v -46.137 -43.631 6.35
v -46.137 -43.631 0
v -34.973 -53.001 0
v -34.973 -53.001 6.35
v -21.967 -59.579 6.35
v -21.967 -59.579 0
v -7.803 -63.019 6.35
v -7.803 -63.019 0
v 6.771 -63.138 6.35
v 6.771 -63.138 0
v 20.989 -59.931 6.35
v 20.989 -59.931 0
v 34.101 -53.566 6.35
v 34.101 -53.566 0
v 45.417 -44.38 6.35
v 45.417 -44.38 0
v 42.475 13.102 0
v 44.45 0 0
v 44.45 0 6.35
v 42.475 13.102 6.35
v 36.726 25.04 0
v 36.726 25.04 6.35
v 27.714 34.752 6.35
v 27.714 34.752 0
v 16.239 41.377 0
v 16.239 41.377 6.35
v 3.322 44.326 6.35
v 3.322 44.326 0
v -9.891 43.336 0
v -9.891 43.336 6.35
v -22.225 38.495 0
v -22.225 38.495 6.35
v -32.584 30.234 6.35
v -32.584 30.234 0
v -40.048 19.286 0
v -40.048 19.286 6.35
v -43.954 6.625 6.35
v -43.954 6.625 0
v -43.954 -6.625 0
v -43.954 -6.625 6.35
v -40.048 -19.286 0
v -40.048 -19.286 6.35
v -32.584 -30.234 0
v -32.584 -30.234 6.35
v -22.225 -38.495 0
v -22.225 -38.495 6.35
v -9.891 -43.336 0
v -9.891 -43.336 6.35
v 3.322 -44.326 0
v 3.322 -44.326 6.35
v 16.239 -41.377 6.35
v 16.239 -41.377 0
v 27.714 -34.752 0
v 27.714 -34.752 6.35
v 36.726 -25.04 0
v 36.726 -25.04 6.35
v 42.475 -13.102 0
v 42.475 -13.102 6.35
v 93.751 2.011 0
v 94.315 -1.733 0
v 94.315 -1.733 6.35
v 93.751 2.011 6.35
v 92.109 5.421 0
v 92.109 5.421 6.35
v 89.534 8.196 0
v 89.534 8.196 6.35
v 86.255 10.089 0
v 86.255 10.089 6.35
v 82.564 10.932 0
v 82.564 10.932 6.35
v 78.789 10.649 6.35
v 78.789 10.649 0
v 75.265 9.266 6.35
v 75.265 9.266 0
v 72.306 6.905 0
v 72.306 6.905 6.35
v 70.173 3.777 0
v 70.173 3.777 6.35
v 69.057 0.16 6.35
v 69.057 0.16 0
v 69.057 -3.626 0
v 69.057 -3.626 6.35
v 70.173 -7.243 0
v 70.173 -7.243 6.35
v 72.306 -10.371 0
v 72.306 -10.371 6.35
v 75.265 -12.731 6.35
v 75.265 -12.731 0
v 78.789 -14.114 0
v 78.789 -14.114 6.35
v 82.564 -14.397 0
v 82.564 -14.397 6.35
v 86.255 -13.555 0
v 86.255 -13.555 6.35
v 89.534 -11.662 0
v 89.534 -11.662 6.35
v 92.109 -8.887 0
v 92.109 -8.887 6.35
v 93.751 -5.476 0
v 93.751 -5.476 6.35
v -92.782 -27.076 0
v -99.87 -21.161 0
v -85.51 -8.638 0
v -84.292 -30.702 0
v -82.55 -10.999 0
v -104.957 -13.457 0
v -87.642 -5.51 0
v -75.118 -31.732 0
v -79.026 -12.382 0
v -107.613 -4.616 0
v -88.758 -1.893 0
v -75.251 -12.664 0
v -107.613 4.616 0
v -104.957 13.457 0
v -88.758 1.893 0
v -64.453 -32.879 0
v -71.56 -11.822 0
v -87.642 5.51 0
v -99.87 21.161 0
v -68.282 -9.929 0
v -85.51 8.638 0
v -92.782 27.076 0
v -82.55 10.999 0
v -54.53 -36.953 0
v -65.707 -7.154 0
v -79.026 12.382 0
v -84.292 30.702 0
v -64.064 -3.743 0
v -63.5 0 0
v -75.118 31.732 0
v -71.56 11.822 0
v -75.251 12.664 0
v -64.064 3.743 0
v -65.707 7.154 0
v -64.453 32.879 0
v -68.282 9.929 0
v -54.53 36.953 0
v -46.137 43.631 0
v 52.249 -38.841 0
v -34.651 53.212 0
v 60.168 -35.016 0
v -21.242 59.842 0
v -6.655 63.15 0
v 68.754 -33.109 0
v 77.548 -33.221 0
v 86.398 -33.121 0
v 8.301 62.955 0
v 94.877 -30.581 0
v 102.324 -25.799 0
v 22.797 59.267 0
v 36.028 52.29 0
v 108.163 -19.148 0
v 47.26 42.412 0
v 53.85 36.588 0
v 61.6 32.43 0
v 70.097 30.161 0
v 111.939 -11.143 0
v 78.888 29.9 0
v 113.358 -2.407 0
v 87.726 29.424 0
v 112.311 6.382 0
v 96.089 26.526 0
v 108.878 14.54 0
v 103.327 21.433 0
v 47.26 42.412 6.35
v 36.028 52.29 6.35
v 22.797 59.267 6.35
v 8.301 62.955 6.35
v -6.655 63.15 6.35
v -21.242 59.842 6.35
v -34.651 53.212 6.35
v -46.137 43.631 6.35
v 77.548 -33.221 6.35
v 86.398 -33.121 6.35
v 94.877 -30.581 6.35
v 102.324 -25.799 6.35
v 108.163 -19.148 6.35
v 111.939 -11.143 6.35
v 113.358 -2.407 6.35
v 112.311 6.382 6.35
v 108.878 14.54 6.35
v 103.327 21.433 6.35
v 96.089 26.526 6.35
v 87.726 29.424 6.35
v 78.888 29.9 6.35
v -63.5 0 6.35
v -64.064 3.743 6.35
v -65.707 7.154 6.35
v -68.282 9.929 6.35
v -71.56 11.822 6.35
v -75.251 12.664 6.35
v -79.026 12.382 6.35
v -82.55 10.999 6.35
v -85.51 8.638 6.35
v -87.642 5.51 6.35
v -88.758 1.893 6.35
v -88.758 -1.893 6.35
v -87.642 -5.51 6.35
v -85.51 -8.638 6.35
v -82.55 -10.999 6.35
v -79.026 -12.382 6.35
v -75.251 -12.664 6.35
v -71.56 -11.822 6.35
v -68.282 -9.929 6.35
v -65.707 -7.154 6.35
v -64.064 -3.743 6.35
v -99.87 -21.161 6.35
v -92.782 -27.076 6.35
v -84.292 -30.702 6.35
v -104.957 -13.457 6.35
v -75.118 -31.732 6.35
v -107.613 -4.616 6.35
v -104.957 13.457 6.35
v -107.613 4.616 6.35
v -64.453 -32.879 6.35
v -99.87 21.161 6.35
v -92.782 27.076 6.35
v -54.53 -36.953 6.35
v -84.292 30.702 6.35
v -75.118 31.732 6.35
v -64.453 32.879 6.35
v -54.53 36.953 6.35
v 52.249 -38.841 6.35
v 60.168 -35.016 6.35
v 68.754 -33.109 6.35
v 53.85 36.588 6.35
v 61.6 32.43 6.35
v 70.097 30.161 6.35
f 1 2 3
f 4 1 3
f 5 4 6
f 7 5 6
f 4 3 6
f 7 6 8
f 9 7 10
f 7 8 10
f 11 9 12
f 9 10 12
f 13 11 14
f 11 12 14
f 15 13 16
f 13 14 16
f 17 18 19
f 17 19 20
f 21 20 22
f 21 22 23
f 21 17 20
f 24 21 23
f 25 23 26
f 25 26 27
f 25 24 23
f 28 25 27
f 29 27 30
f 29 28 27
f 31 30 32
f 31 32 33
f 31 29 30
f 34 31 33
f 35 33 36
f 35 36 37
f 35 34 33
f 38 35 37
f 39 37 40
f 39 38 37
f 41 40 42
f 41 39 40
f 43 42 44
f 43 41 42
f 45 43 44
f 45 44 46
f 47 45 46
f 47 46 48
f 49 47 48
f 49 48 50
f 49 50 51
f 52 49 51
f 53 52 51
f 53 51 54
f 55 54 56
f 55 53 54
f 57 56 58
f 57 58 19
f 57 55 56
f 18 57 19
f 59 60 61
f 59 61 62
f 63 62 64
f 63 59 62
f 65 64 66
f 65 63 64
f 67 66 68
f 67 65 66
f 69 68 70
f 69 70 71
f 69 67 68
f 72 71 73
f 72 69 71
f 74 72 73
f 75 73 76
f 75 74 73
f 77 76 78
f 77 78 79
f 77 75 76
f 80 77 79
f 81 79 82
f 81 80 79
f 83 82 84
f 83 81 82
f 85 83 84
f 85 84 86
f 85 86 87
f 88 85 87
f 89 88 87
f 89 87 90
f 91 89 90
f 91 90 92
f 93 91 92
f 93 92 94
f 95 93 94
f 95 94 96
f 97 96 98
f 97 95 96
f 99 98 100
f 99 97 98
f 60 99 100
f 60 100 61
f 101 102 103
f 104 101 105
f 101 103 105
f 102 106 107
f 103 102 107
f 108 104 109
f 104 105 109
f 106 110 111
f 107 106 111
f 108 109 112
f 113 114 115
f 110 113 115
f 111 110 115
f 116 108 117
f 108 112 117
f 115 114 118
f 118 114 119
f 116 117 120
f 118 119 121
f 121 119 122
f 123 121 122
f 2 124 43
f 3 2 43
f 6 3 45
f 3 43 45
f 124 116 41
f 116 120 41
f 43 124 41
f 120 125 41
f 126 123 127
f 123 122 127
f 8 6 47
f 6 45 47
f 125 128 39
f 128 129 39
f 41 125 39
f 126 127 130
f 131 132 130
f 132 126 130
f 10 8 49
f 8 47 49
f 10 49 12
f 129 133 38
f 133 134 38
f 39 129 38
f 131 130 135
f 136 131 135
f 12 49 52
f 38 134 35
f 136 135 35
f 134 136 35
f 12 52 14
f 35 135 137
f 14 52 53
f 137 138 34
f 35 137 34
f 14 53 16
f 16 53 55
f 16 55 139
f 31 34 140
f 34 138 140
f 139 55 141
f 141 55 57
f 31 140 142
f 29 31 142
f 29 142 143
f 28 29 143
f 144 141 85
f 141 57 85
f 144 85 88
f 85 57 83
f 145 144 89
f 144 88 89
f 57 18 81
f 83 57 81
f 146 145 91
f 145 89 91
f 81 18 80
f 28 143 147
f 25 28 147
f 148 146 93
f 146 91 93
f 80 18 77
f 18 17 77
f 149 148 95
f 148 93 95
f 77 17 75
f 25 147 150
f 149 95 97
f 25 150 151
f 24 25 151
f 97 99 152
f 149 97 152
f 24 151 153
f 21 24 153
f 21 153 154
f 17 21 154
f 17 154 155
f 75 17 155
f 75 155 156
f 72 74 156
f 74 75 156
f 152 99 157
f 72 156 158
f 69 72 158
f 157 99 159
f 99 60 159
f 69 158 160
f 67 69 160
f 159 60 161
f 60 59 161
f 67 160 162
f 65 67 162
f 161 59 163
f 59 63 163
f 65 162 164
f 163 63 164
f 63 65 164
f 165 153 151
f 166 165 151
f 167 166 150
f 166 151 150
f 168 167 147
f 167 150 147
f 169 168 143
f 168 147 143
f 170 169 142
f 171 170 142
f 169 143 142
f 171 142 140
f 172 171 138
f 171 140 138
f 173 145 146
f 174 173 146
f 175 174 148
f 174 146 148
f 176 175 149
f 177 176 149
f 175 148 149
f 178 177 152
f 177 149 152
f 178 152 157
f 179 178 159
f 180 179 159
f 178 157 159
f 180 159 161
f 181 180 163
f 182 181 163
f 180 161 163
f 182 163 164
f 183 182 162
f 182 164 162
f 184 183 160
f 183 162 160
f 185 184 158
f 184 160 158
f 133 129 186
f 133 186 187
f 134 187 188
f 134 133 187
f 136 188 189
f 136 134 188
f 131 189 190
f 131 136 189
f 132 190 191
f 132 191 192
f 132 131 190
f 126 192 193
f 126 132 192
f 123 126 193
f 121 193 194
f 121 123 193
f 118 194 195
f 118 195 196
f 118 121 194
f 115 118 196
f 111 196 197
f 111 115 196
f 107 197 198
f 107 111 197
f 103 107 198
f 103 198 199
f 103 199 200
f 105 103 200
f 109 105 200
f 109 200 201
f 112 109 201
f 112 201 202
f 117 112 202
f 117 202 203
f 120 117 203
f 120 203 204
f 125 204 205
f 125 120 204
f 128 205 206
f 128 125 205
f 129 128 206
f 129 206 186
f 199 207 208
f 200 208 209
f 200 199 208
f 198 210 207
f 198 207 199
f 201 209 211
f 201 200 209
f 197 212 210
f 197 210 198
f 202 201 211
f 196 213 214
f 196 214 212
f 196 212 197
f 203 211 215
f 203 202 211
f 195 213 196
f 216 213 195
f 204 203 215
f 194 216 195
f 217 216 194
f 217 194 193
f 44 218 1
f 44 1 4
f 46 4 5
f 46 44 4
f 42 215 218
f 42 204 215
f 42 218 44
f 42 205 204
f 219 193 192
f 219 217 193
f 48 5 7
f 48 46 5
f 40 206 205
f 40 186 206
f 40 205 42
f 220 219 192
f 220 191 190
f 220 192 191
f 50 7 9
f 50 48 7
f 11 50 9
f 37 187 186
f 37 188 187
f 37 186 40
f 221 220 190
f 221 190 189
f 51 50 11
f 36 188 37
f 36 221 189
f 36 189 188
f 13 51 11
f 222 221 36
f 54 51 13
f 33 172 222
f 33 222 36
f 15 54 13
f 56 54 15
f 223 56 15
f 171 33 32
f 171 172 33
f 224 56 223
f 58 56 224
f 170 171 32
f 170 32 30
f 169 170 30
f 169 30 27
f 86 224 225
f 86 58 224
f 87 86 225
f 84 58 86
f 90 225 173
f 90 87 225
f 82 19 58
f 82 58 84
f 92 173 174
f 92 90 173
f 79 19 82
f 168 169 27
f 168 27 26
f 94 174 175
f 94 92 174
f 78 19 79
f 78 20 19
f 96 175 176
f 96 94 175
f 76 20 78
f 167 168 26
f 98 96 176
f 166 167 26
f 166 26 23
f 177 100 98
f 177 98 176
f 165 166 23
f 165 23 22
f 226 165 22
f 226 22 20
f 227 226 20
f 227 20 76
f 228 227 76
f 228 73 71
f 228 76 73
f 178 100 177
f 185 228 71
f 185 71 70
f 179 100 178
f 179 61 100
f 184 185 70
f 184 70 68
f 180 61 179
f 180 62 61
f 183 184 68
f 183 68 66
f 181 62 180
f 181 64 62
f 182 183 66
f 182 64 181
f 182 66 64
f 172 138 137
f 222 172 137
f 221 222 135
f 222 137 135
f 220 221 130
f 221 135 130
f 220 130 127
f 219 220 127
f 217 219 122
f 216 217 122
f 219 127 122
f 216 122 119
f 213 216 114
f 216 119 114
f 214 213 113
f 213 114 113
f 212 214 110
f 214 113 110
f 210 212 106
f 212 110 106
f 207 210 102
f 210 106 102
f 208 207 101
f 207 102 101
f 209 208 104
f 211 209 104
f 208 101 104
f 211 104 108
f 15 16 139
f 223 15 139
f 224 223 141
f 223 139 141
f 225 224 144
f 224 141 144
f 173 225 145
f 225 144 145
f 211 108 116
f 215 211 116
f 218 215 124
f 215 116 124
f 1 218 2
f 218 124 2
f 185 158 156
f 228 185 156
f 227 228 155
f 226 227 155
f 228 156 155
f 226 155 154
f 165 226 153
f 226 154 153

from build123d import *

# Parameters (mm, degrees)
F0_R     = 12.7
F0_R_2   = 44.45
F1_DEPTH = 6.35


# Not quite as in the source:
# - a length typed as a fraction of an inch, garbled in the dataset ("3 / 203.2 mm" for 3/8 in), is restored


with BuildPart() as f1:
    # F0 (on Top) → F1 (new body)
    with BuildSketch(Plane.XY):
        with BuildLine():
            ThreePointArc((-46.13671875, 43.6308741946), (-59.3475236203, 34.5646316236), (-75.1176136364, 31.7315448688))
            ThreePointArc((-75.1176136364, 31.7315448688), (-107.95, 0), (-75.1176136364, -31.7315448688))
            ThreePointArc((-75.1176136364, -31.7315448688), (-59.3475236203, -34.5646316236), (-46.13671875, -43.6308741946))
            ThreePointArc((-46.13671875, -43.6308741946), (-0.5192783502, -63.4978767361), (45.4169792735, -44.3795898321))
            ThreePointArc((45.4169792735, -44.3795898321), (60.1682182179, -35.0158685824), (77.5480268965, -33.2212721562))
            ThreePointArc((77.5480268965, -33.2212721562), (113.3582561105, -2.4068513639), (78.8882291033, 29.8997777276))
            ThreePointArc((78.8882291033, 29.8997777276), (61.6002556172, 32.4304493339), (47.2597573079, 42.4118537581))
            ThreePointArc((47.2597573079, 42.4118537581), (0.8287379603, 63.4945918437), (-46.13671875, 43.6308741946))
        make_face()
        with Locations((81.6154102788, -1.7328791769)):
            Circle(F0_R, mode=Mode.SUBTRACT)
        with Locations((-76.2, 0)):
            Circle(F0_R, mode=Mode.SUBTRACT)
        Circle(F0_R_2, mode=Mode.SUBTRACT)
    extrude(amount=F1_DEPTH)


solid = f1.part
